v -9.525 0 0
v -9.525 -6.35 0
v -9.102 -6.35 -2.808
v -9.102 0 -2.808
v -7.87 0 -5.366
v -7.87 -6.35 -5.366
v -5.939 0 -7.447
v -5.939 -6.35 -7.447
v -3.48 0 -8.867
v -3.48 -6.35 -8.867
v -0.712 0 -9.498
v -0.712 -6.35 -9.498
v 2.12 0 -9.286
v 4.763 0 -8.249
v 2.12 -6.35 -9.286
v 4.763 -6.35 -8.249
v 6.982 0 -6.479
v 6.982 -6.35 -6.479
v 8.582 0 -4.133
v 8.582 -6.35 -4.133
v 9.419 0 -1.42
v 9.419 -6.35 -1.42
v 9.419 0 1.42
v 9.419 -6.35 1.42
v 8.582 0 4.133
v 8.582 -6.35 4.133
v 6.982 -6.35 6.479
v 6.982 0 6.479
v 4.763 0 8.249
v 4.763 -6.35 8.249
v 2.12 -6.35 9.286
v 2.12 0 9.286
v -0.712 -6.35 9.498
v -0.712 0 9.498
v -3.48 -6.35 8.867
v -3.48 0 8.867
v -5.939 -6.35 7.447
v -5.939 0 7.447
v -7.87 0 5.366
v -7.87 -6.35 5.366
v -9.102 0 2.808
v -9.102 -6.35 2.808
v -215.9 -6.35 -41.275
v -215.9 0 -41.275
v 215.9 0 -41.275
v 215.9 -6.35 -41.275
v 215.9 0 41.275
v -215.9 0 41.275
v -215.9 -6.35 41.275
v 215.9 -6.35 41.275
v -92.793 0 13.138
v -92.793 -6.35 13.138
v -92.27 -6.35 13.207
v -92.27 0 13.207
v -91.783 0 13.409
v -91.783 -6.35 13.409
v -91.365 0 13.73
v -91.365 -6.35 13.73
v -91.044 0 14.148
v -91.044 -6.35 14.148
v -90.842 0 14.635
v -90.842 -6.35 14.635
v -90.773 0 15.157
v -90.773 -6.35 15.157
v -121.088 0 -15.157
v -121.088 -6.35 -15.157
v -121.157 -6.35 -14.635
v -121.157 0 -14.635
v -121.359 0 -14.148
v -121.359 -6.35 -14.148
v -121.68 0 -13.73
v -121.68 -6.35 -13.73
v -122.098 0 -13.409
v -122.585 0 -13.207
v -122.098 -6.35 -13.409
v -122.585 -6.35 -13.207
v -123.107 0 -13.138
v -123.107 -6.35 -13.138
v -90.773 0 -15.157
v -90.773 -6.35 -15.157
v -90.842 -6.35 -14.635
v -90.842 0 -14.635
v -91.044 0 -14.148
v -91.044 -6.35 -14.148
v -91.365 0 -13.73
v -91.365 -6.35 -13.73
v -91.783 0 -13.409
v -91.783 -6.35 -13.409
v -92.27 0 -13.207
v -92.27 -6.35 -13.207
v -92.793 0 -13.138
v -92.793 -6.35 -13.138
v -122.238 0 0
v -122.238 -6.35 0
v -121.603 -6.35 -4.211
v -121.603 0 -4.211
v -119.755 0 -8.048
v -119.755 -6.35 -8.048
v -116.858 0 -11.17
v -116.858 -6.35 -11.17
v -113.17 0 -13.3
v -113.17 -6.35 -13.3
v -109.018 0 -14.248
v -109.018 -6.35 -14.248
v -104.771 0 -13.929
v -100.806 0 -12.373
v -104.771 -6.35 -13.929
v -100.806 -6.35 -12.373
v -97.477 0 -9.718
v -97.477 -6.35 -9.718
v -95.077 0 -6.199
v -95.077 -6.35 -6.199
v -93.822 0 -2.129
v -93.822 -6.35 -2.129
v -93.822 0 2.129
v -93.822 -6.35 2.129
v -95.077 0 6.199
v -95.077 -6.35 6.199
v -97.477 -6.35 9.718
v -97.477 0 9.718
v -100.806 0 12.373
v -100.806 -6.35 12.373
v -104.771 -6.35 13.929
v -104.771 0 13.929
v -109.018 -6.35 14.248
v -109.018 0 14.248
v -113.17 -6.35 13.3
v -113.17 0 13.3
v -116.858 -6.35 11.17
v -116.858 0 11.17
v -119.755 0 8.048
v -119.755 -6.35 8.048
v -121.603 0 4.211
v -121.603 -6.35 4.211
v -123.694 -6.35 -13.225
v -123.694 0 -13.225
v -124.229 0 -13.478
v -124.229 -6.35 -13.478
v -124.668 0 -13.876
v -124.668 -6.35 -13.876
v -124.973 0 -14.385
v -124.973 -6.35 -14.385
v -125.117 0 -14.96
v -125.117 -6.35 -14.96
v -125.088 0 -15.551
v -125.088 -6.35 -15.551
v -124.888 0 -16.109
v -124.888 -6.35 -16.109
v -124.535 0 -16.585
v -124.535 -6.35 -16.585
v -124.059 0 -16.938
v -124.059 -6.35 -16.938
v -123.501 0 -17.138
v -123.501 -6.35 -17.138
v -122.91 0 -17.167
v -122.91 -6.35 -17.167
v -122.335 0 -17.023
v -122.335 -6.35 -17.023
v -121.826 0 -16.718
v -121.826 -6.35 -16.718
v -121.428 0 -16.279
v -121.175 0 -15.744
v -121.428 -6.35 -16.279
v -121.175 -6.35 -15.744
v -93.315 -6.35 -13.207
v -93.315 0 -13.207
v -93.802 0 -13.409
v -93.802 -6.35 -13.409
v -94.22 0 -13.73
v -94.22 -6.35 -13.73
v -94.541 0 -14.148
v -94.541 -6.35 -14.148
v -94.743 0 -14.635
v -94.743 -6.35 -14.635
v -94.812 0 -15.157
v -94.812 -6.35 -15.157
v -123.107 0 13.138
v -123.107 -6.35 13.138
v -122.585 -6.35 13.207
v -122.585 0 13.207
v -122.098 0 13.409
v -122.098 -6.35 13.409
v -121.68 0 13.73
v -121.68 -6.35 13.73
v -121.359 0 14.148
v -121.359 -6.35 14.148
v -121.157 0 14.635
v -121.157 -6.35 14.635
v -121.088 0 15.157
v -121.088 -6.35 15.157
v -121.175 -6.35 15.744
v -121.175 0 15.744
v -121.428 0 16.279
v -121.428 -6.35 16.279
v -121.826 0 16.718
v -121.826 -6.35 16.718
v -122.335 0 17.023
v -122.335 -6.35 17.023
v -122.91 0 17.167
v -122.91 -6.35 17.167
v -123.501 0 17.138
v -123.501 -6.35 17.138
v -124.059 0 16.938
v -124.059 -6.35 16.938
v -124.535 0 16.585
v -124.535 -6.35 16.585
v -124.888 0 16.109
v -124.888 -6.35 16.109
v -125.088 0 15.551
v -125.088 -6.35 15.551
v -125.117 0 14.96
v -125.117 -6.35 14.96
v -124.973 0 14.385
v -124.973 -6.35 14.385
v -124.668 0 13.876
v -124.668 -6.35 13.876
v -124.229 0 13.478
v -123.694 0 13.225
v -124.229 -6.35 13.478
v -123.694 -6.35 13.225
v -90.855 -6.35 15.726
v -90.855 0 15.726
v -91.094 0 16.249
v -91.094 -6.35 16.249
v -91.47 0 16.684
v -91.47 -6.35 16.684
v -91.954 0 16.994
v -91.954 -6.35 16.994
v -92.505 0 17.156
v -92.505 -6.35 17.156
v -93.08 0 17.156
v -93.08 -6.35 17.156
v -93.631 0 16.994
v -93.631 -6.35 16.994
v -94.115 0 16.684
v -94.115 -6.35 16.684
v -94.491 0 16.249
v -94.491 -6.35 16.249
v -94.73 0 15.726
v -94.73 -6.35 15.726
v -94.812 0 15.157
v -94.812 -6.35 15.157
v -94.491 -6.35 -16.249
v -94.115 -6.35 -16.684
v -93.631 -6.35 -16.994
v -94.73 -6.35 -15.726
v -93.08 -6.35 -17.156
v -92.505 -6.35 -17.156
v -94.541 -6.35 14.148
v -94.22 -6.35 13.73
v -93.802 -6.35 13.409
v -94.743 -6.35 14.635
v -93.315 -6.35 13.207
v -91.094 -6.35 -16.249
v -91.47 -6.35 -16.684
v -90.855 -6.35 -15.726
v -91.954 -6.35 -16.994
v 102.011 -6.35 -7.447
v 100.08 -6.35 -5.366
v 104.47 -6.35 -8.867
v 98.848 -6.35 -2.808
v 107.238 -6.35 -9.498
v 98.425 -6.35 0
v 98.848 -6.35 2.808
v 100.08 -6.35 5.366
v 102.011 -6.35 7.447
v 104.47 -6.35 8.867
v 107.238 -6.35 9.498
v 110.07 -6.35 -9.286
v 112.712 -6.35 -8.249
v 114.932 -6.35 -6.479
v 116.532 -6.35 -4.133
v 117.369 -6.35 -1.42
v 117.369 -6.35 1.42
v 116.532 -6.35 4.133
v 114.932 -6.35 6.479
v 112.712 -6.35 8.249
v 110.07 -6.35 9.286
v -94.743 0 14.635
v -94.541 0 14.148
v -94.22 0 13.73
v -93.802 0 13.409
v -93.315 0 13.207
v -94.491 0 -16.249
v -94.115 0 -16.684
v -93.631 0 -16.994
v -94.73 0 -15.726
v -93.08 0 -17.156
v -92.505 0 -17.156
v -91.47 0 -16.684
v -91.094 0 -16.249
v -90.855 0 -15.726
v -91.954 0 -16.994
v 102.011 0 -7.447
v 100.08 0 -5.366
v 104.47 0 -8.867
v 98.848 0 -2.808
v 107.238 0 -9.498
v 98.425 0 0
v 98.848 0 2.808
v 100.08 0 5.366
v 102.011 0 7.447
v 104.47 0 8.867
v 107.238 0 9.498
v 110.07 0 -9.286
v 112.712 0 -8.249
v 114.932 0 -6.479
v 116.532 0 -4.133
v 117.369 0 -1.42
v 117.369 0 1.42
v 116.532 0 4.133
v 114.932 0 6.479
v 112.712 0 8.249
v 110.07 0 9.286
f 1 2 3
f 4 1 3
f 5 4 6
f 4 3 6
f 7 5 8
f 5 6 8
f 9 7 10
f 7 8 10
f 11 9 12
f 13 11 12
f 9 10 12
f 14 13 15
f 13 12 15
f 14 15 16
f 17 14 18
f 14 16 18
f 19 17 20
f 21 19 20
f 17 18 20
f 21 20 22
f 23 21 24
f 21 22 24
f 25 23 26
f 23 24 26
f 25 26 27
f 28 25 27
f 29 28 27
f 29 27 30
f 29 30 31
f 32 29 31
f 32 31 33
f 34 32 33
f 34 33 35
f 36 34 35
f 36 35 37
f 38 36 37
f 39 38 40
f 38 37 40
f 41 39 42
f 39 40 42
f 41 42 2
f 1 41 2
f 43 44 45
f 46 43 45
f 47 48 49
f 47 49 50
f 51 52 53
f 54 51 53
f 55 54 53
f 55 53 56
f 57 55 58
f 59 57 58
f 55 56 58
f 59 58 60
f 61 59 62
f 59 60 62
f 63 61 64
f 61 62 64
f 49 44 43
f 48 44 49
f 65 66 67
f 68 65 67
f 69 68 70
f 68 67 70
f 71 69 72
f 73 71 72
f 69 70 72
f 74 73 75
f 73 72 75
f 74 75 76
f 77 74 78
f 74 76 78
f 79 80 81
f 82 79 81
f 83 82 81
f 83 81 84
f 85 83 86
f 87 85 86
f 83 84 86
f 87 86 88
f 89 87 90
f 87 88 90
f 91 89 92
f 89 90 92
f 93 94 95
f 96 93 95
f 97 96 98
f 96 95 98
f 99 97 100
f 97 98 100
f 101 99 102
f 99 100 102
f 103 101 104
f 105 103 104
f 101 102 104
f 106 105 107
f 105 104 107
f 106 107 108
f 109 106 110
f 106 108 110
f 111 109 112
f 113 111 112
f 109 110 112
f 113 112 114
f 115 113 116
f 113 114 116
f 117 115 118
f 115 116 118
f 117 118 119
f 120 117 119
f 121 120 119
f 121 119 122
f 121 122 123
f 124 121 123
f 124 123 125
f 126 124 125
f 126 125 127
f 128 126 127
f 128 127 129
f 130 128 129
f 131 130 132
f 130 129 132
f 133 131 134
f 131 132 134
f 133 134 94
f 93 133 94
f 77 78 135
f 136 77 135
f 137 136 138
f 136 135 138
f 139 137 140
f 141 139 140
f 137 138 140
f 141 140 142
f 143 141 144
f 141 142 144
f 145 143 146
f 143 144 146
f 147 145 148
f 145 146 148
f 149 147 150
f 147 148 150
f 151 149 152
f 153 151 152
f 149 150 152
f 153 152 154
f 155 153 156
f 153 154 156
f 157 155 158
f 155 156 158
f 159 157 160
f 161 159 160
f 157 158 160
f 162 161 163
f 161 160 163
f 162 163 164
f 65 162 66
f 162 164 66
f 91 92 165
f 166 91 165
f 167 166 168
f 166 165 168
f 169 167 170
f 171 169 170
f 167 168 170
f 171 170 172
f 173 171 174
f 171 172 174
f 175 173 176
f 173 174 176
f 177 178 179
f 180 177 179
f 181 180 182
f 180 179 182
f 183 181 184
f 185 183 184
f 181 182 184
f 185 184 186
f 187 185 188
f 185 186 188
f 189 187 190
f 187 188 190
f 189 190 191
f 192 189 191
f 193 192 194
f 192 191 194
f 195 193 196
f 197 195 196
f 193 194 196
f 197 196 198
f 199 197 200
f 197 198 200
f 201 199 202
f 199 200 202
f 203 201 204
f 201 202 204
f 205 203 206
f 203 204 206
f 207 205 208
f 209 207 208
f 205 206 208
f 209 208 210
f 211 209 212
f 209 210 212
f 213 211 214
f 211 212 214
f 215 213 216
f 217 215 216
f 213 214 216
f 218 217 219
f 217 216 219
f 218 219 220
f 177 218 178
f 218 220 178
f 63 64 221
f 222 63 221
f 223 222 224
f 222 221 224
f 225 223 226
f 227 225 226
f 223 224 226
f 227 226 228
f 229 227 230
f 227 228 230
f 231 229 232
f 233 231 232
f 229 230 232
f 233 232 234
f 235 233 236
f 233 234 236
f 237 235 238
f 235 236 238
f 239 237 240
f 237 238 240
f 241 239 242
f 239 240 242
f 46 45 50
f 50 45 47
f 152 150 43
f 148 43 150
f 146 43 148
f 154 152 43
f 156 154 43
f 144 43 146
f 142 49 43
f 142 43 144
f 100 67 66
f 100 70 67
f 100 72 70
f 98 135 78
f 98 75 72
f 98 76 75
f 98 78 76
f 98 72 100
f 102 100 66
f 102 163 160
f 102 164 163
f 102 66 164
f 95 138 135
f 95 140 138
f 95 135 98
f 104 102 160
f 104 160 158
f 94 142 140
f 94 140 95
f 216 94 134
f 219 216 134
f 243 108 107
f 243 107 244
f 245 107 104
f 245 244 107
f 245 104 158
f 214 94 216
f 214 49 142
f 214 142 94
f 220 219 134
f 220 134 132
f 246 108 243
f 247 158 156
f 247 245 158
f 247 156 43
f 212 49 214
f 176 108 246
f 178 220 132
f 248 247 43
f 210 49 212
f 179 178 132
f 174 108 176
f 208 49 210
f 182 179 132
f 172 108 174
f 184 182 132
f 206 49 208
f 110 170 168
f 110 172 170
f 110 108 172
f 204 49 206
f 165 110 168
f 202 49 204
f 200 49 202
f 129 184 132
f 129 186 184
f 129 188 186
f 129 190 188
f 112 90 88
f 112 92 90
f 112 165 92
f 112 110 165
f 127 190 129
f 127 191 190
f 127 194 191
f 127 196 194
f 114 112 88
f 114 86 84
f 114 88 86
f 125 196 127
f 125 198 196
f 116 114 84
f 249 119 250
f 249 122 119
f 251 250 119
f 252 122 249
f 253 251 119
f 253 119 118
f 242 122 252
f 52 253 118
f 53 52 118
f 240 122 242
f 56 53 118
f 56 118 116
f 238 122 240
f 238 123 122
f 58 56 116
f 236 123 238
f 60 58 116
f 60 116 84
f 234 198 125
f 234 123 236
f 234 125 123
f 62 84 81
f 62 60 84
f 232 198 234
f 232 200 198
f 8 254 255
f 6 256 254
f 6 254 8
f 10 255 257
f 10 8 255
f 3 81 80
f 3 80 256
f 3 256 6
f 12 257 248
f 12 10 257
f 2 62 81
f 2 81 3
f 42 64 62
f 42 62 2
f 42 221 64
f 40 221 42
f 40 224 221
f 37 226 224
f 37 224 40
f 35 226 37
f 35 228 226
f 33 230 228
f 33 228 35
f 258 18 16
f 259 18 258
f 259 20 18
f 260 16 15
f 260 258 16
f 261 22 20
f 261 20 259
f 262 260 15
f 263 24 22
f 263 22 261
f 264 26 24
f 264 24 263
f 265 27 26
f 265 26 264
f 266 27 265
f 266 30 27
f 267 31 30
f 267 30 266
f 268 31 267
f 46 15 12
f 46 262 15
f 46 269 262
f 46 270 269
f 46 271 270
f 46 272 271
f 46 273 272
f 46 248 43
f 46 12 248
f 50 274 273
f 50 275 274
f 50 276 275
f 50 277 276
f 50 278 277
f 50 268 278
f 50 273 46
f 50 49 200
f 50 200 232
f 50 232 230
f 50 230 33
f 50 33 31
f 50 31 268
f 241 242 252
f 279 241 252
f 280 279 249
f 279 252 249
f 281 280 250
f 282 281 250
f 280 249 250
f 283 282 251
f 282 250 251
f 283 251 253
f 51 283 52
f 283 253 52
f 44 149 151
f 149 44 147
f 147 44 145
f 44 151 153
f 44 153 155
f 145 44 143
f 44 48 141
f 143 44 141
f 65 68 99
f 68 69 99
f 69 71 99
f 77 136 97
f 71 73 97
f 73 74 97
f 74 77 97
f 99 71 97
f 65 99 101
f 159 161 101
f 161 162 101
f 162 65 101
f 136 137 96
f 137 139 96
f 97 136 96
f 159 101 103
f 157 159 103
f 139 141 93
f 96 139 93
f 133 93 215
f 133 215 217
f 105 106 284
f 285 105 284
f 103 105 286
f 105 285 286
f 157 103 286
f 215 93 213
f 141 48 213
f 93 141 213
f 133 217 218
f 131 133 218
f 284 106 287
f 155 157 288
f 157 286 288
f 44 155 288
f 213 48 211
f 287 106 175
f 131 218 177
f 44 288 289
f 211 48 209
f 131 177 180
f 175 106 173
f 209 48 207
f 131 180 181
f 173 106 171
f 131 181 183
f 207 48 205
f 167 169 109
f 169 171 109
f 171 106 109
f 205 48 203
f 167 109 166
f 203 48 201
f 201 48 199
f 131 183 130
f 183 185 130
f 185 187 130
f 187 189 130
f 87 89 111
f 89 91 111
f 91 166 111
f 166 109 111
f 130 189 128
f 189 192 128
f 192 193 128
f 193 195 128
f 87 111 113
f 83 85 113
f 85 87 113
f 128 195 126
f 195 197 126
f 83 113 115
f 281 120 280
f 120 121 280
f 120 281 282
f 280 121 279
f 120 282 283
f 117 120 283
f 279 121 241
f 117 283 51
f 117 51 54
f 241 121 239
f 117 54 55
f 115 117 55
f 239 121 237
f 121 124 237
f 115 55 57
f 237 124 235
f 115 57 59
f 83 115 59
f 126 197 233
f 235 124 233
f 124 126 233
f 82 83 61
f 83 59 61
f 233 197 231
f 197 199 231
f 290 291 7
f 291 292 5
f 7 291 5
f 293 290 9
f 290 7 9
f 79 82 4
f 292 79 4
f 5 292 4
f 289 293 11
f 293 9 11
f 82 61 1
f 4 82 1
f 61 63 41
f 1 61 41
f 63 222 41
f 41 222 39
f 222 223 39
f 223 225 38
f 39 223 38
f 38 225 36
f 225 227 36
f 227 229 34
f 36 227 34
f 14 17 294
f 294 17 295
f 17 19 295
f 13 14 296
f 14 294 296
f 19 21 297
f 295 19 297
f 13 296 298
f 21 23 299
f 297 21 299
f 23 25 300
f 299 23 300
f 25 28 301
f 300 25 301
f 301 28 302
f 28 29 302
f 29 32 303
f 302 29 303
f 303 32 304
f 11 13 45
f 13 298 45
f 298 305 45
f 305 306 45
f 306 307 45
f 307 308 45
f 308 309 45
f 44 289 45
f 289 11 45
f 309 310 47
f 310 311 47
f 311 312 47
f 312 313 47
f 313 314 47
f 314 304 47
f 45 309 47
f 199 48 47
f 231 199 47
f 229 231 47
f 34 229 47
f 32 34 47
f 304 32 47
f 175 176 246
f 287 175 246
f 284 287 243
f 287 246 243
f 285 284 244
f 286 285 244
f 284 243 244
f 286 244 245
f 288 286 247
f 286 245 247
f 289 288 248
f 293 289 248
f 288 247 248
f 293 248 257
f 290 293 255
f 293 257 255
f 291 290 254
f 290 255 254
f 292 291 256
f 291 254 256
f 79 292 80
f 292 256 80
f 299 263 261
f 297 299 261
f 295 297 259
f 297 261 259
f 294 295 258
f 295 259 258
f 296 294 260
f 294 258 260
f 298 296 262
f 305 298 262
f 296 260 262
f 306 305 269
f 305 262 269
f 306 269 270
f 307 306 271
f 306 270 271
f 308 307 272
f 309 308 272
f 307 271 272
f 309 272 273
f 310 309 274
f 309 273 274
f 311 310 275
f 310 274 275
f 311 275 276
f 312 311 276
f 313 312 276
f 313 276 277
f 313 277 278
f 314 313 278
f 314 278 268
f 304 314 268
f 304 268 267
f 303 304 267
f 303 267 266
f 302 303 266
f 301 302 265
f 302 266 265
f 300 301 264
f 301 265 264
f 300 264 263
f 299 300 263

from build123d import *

# Parameters (mm, degrees)
F0_W     = 431.8
F0_H     = 82.55
F1_DEPTH = 6.35
F3_DEPTH = 6.35
F5_DEPTH = 6.35


with BuildPart() as f1:
    # F0 (on Front) → F1 (new body)
    with BuildSketch(Plane.XZ):
        Rectangle(F0_W, F0_H)
    extrude(amount=F1_DEPTH)

    # F2 (on face) → F3 (cut, through all)
    with BuildSketch(Plane.XZ.offset(6.35)):
        with BuildLine():
            ThreePointArc((-93.6625, 0), (-107.95, 14.2875), (-122.2375, 0))
            Line((-122.2375, 0), (-93.6625, 0))
        make_face()
        with BuildLine():
            ThreePointArc((117.475, 0), (107.95, 9.525), (98.425, 0))
            Line((98.425, 0), (117.475, 0))
        make_face()
        with BuildLine():
            Line((117.475, 0), (98.425, 0))
            ThreePointArc((98.425, 0), (107.95, -9.525), (117.475, 0))
        make_face()
        with BuildLine():
            ThreePointArc((9.525, 0), (0, 9.525), (-9.525, 0))
            Line((-9.525, 0), (9.525, 0))
        make_face()
        with BuildLine():
            Line((9.525, 0), (-9.525, 0))
            ThreePointArc((-9.525, 0), (0, -9.525), (9.525, 0))
        make_face()
        with BuildLine():
            Line((-93.6625, 0), (-122.2375, 0))
            ThreePointArc((-122.2375, 0), (-107.95, -14.2875), (-93.6625, 0))
        make_face()
    extrude(amount=-F3_DEPTH, mode=Mode.SUBTRACT)

    # F4 (on face) → F5 (cut, through all)
    with BuildSketch(Plane.XZ.offset(6.35)):
        with BuildLine():
            Line((-123.10745, -15.15745), (-123.10745, -13.13815))
            ThreePointArc((-123.10745, -13.13815), (-124.535311, -16.585311), (-121.08815, -15.15745))
            Line((-121.08815, -15.15745), (-123.10745, -15.15745))
        make_face()
        with BuildLine():
            ThreePointArc((-121.08815, -15.15745), (-121.679589, -13.729589), (-123.10745, -13.13815))
            Line((-123.10745, -13.13815), (-123.10745, -15.15745))
            Line((-123.10745, -15.15745), (-121.08815, -15.15745))
        make_face()
        with BuildLine():
            ThreePointArc((-90.77325, -15.15745), (-91.364689, -13.729589), (-92.79255, -13.13815))
            Line((-92.79255, -13.13815), (-92.79255, -15.15745))
            Line((-92.79255, -15.15745), (-94.81185, -15.15745))
            ThreePointArc((-94.81185, -15.15745), (-92.79255, -17.17675), (-90.77325, -15.15745))
        make_face()
        with BuildLine():
            Line((-92.79255, -15.15745), (-92.79255, -13.13815))
            ThreePointArc((-92.79255, -13.13815), (-94.220411, -13.729589), (-94.81185, -15.15745))
            Line((-94.81185, -15.15745), (-92.79255, -15.15745))
        make_face()
        with BuildLine():
            Line((-92.79255, 15.15745), (-94.81185, 15.15745))
            ThreePointArc((-94.81185, 15.15745), (-94.220411, 13.729589), (-92.79255, 13.13815))
            Line((-92.79255, 13.13815), (-92.79255, 15.15745))
        make_face()
        with BuildLine():
            ThreePointArc((-90.77325, 15.15745), (-92.79255, 17.17675), (-94.81185, 15.15745))
            Line((-94.81185, 15.15745), (-92.79255, 15.15745))
            Line((-92.79255, 15.15745), (-92.79255, 13.13815))
            ThreePointArc((-92.79255, 13.13815), (-91.364689, 13.729589), (-90.77325, 15.15745))
        make_face()
        with BuildLine():
            ThreePointArc((-123.10745, 13.13815), (-121.679589, 13.729589), (-121.08815, 15.15745))
            Line((-121.08815, 15.15745), (-123.10745, 15.15745))
            Line((-123.10745, 15.15745), (-123.10745, 13.13815))
        make_face()
        with BuildLine():
            Line((-123.10745, 15.15745), (-121.08815, 15.15745))
            ThreePointArc((-121.08815, 15.15745), (-124.535311, 16.585311), (-123.10745, 13.13815))
            Line((-123.10745, 13.13815), (-123.10745, 15.15745))
        make_face()
    extrude(amount=-F5_DEPTH, mode=Mode.SUBTRACT)


solid = f1.part
